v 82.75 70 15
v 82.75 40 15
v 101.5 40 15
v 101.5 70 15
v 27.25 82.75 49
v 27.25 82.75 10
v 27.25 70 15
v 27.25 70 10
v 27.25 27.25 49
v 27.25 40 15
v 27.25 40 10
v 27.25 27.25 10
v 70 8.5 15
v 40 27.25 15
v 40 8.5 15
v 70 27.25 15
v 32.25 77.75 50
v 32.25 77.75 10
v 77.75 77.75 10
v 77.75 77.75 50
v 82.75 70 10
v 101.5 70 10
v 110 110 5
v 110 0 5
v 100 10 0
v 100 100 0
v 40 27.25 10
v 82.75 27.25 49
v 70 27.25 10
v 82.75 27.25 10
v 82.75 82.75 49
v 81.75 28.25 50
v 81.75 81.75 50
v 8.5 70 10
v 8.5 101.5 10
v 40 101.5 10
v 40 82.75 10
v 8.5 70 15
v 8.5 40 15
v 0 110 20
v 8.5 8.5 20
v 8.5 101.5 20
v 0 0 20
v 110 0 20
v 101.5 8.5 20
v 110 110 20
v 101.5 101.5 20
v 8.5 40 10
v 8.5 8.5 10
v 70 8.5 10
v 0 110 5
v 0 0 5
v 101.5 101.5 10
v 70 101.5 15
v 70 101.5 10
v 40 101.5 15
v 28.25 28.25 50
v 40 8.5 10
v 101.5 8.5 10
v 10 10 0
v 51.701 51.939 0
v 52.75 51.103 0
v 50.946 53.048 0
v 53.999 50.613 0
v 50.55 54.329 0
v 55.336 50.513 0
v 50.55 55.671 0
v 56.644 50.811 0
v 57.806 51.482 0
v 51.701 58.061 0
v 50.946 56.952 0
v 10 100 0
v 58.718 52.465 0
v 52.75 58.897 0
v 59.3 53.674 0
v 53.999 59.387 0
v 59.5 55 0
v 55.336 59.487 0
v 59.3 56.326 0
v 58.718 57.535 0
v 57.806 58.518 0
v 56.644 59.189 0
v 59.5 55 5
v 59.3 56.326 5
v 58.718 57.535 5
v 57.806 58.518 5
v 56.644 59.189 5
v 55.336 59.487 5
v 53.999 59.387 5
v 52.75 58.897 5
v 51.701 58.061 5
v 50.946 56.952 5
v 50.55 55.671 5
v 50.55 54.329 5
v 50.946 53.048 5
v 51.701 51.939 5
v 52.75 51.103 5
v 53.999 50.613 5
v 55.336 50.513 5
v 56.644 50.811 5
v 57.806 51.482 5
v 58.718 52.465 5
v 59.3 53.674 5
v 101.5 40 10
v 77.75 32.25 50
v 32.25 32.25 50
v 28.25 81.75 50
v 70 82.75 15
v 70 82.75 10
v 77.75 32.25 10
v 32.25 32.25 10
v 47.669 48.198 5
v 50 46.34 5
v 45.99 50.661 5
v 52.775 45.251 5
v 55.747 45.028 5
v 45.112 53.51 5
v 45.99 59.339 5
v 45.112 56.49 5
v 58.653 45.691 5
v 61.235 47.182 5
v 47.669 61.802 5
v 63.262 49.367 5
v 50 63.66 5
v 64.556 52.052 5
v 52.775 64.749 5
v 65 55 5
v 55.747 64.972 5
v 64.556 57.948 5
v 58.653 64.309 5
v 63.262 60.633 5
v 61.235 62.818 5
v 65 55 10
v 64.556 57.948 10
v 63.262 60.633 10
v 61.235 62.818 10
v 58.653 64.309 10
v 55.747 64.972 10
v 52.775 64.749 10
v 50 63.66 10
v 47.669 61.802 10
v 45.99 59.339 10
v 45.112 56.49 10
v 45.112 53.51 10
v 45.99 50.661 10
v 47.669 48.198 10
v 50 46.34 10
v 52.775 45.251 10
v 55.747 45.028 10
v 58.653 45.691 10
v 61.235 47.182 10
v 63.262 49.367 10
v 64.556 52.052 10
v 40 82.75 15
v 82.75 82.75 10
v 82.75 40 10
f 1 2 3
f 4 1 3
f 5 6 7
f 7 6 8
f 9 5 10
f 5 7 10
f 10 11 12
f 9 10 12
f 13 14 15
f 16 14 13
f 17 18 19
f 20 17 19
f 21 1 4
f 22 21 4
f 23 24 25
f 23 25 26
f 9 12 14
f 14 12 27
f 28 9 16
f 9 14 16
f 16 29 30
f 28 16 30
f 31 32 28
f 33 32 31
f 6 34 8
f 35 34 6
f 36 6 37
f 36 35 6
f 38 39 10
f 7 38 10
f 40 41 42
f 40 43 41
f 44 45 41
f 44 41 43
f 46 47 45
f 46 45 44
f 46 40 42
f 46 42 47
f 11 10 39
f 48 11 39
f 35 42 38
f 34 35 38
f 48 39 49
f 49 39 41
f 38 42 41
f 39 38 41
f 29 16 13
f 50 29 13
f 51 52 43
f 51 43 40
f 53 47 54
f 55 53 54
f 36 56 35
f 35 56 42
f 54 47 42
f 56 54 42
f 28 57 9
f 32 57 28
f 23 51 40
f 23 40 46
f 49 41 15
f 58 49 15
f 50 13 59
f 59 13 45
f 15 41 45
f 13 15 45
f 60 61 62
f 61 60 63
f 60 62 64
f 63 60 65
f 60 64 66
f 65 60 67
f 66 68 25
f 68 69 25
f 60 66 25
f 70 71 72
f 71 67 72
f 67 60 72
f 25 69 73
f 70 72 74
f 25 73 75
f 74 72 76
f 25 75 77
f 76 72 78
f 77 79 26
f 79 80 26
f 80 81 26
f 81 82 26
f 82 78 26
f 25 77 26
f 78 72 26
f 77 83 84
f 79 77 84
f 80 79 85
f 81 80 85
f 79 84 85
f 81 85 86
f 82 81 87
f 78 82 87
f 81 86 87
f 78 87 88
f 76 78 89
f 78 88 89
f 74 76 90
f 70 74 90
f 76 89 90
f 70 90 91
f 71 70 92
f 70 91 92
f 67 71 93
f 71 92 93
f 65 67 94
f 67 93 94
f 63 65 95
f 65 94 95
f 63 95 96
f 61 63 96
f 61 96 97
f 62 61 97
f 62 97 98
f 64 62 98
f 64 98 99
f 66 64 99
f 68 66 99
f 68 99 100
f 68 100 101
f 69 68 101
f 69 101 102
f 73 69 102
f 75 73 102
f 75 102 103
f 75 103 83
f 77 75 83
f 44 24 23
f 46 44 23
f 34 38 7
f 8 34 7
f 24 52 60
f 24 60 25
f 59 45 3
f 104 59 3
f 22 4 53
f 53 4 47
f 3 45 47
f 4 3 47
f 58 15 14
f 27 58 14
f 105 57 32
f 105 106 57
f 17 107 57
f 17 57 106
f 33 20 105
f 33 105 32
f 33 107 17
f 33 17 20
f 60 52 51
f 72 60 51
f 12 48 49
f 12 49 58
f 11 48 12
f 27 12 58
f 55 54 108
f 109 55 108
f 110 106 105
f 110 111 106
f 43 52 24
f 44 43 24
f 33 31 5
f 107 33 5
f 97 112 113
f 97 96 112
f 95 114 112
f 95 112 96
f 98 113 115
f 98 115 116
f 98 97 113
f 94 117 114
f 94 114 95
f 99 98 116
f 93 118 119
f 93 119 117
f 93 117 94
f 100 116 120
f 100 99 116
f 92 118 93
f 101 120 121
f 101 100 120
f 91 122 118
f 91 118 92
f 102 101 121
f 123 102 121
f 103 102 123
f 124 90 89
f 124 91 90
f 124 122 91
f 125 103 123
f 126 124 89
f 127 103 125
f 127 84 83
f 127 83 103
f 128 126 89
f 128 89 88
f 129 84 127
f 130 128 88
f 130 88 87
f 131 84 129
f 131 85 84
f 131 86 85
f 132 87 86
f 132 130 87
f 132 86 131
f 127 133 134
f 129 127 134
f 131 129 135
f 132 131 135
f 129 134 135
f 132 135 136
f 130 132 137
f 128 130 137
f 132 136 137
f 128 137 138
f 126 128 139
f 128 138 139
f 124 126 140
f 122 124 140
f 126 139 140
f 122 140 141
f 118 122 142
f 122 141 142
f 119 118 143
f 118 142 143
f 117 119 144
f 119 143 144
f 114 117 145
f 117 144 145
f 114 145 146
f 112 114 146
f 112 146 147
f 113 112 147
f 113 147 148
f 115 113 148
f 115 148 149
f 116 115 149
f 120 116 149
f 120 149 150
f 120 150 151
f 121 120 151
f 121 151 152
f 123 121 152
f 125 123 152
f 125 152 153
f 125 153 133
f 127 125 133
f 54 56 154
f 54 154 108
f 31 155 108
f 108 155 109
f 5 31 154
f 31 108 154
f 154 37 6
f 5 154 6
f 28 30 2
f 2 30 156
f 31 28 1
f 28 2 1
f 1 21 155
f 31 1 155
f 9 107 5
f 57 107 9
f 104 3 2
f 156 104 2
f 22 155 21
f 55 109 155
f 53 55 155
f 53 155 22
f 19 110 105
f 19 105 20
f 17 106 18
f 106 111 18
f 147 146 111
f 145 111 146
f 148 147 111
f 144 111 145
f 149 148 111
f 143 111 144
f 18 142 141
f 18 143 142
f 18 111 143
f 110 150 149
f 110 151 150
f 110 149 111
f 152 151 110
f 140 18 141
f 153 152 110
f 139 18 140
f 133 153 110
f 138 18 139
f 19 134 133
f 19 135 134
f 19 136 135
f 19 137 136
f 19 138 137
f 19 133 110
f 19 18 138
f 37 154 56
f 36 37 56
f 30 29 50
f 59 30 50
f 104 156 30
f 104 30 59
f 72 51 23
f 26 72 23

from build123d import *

# Parameters (mm, degrees)
F0_W      = 110
F0_H      = 110
F1_DEPTH  = 20
F2_W      = 30
F2_H      = 18.75
F2_W_2    = 18.75
F2_H_2    = 30
F3_DEPTH  = 5
F2_W_3    = 45.5
F2_H_3    = 45.5
F4_DEPTH  = 30
F2_R      = 4.5
F5_DEPTH  = 20.001
F2_R_2    = 10
F6_DEPTH  = 10
F7_SIZE2  = 5
F7_SIZE   = 10
F8_SIZE   = 1
F9_DEPTH  = 10
F10_DEPTH = 15


with BuildPart() as f1:
    # F0 (on Top) → F1 (new body)
    with BuildSketch(Plane.XY):
        with Locations((55, 55)):
            Rectangle(F0_W, F0_H)
    extrude(amount=F1_DEPTH)

    # F2 (on face) → F3 (cut)
    with BuildSketch(Plane.XY.offset(20)):
        Polygon((27.25, 70), (27.25, 82.75), (40, 82.75), (40, 101.5), (8.5, 101.5), (8.5, 70), align=None)
        with Locations((55, 92.125)):
            Rectangle(F2_W, F2_H)
        Polygon((70, 101.5), (70, 82.75), (82.75, 82.75), (82.75, 70), (101.5, 70), (101.5, 101.5), align=None)
        with Locations((92.125, 55)):
            Rectangle(F2_W_2, F2_H_2)
        with Locations((55, 17.875)):
            Rectangle(F2_W, F2_H)
        with Locations((17.875, 55)):
            Rectangle(F2_W_2, F2_H_2)
    extrude(amount=-F3_DEPTH, mode=Mode.SUBTRACT)

    # F2 (on face) → F4 (join)
    with BuildSketch(Plane.XY.offset(20)):
        Polygon((40, 82.75), (27.25, 82.75), (27.25, 70), (27.25, 40), (27.25, 27.25), (40, 27.25), (70, 27.25), (82.75, 27.25), (82.75, 40), (82.75, 70), (82.75, 82.75), (70, 82.75), align=None)
        with Locations((55, 55)):
            Rectangle(F2_W_3, F2_H_3, mode=Mode.SUBTRACT)
    extrude(amount=F4_DEPTH)

    # F2 (on face) → F5 (cut, through all)
    with BuildSketch(Plane.XY.offset(20)):
        with Locations((55, 55)):
            Circle(F2_R)
    extrude(amount=-F5_DEPTH, mode=Mode.SUBTRACT)

    # F2 (on face) → F6 (cut)
    with BuildSketch(Plane.XY.offset(20)):
        with Locations((55, 55)):
            Rectangle(F2_W_3, F2_H_3)
        with Locations((55, 55)):
            Circle(F2_R_2, mode=Mode.SUBTRACT)
    extrude(amount=-F6_DEPTH, mode=Mode.SUBTRACT)

    # F7
    f7_edges = [f1.edges().sort_by_distance(p)[0] for p in [
        (55, 110, 0),
        (0, 55, 0),
        (55, 0, 0),
        (110, 55, 0),
    ]]
    f7_side = f1.faces().sort_by_distance((1.555635, 55, 0))[0]
    chamfer(f7_edges, length=F7_SIZE, length2=F7_SIZE2, reference=f7_side)

    # F8
    f8_edges = [f1.edges().sort_by_distance(p)[0] for p in [
        (55, 27.25, 50),
        (27.25, 55, 50),
        (82.75, 55, 50),
        (55, 82.75, 50),
    ]]
    chamfer(f8_edges, length=F8_SIZE)

    # F2 (on face) → F9 (cut)
    with BuildSketch(Plane.XY.offset(20)):
        Polygon((27.25, 70), (27.25, 82.75), (40, 82.75), (40, 101.5), (8.5, 101.5), (8.5, 70), align=None)
        Polygon((27.25, 27.25), (27.25, 40), (8.5, 40), (8.5, 8.5), (40, 8.5), (40, 27.25), align=None)
        Polygon((101.5, 40), (82.75, 40), (82.75, 27.25), (70, 27.25), (70, 8.5), (101.5, 8.5), align=None)
        Polygon((70, 101.5), (70, 82.75), (82.75, 82.75), (82.75, 70), (101.5, 70), (101.5, 101.5), align=None)
    extrude(amount=-F9_DEPTH, mode=Mode.SUBTRACT)

    # F2 (on face) → F10 (cut)
    with BuildSketch(Plane.XY.offset(20)):
        with Locations((55, 55)):
            Circle(F2_R_2)
        with Locations((55, 55)):
            Circle(F2_R, mode=Mode.SUBTRACT)
    extrude(amount=-F10_DEPTH, mode=Mode.SUBTRACT)


solid = f1.part
